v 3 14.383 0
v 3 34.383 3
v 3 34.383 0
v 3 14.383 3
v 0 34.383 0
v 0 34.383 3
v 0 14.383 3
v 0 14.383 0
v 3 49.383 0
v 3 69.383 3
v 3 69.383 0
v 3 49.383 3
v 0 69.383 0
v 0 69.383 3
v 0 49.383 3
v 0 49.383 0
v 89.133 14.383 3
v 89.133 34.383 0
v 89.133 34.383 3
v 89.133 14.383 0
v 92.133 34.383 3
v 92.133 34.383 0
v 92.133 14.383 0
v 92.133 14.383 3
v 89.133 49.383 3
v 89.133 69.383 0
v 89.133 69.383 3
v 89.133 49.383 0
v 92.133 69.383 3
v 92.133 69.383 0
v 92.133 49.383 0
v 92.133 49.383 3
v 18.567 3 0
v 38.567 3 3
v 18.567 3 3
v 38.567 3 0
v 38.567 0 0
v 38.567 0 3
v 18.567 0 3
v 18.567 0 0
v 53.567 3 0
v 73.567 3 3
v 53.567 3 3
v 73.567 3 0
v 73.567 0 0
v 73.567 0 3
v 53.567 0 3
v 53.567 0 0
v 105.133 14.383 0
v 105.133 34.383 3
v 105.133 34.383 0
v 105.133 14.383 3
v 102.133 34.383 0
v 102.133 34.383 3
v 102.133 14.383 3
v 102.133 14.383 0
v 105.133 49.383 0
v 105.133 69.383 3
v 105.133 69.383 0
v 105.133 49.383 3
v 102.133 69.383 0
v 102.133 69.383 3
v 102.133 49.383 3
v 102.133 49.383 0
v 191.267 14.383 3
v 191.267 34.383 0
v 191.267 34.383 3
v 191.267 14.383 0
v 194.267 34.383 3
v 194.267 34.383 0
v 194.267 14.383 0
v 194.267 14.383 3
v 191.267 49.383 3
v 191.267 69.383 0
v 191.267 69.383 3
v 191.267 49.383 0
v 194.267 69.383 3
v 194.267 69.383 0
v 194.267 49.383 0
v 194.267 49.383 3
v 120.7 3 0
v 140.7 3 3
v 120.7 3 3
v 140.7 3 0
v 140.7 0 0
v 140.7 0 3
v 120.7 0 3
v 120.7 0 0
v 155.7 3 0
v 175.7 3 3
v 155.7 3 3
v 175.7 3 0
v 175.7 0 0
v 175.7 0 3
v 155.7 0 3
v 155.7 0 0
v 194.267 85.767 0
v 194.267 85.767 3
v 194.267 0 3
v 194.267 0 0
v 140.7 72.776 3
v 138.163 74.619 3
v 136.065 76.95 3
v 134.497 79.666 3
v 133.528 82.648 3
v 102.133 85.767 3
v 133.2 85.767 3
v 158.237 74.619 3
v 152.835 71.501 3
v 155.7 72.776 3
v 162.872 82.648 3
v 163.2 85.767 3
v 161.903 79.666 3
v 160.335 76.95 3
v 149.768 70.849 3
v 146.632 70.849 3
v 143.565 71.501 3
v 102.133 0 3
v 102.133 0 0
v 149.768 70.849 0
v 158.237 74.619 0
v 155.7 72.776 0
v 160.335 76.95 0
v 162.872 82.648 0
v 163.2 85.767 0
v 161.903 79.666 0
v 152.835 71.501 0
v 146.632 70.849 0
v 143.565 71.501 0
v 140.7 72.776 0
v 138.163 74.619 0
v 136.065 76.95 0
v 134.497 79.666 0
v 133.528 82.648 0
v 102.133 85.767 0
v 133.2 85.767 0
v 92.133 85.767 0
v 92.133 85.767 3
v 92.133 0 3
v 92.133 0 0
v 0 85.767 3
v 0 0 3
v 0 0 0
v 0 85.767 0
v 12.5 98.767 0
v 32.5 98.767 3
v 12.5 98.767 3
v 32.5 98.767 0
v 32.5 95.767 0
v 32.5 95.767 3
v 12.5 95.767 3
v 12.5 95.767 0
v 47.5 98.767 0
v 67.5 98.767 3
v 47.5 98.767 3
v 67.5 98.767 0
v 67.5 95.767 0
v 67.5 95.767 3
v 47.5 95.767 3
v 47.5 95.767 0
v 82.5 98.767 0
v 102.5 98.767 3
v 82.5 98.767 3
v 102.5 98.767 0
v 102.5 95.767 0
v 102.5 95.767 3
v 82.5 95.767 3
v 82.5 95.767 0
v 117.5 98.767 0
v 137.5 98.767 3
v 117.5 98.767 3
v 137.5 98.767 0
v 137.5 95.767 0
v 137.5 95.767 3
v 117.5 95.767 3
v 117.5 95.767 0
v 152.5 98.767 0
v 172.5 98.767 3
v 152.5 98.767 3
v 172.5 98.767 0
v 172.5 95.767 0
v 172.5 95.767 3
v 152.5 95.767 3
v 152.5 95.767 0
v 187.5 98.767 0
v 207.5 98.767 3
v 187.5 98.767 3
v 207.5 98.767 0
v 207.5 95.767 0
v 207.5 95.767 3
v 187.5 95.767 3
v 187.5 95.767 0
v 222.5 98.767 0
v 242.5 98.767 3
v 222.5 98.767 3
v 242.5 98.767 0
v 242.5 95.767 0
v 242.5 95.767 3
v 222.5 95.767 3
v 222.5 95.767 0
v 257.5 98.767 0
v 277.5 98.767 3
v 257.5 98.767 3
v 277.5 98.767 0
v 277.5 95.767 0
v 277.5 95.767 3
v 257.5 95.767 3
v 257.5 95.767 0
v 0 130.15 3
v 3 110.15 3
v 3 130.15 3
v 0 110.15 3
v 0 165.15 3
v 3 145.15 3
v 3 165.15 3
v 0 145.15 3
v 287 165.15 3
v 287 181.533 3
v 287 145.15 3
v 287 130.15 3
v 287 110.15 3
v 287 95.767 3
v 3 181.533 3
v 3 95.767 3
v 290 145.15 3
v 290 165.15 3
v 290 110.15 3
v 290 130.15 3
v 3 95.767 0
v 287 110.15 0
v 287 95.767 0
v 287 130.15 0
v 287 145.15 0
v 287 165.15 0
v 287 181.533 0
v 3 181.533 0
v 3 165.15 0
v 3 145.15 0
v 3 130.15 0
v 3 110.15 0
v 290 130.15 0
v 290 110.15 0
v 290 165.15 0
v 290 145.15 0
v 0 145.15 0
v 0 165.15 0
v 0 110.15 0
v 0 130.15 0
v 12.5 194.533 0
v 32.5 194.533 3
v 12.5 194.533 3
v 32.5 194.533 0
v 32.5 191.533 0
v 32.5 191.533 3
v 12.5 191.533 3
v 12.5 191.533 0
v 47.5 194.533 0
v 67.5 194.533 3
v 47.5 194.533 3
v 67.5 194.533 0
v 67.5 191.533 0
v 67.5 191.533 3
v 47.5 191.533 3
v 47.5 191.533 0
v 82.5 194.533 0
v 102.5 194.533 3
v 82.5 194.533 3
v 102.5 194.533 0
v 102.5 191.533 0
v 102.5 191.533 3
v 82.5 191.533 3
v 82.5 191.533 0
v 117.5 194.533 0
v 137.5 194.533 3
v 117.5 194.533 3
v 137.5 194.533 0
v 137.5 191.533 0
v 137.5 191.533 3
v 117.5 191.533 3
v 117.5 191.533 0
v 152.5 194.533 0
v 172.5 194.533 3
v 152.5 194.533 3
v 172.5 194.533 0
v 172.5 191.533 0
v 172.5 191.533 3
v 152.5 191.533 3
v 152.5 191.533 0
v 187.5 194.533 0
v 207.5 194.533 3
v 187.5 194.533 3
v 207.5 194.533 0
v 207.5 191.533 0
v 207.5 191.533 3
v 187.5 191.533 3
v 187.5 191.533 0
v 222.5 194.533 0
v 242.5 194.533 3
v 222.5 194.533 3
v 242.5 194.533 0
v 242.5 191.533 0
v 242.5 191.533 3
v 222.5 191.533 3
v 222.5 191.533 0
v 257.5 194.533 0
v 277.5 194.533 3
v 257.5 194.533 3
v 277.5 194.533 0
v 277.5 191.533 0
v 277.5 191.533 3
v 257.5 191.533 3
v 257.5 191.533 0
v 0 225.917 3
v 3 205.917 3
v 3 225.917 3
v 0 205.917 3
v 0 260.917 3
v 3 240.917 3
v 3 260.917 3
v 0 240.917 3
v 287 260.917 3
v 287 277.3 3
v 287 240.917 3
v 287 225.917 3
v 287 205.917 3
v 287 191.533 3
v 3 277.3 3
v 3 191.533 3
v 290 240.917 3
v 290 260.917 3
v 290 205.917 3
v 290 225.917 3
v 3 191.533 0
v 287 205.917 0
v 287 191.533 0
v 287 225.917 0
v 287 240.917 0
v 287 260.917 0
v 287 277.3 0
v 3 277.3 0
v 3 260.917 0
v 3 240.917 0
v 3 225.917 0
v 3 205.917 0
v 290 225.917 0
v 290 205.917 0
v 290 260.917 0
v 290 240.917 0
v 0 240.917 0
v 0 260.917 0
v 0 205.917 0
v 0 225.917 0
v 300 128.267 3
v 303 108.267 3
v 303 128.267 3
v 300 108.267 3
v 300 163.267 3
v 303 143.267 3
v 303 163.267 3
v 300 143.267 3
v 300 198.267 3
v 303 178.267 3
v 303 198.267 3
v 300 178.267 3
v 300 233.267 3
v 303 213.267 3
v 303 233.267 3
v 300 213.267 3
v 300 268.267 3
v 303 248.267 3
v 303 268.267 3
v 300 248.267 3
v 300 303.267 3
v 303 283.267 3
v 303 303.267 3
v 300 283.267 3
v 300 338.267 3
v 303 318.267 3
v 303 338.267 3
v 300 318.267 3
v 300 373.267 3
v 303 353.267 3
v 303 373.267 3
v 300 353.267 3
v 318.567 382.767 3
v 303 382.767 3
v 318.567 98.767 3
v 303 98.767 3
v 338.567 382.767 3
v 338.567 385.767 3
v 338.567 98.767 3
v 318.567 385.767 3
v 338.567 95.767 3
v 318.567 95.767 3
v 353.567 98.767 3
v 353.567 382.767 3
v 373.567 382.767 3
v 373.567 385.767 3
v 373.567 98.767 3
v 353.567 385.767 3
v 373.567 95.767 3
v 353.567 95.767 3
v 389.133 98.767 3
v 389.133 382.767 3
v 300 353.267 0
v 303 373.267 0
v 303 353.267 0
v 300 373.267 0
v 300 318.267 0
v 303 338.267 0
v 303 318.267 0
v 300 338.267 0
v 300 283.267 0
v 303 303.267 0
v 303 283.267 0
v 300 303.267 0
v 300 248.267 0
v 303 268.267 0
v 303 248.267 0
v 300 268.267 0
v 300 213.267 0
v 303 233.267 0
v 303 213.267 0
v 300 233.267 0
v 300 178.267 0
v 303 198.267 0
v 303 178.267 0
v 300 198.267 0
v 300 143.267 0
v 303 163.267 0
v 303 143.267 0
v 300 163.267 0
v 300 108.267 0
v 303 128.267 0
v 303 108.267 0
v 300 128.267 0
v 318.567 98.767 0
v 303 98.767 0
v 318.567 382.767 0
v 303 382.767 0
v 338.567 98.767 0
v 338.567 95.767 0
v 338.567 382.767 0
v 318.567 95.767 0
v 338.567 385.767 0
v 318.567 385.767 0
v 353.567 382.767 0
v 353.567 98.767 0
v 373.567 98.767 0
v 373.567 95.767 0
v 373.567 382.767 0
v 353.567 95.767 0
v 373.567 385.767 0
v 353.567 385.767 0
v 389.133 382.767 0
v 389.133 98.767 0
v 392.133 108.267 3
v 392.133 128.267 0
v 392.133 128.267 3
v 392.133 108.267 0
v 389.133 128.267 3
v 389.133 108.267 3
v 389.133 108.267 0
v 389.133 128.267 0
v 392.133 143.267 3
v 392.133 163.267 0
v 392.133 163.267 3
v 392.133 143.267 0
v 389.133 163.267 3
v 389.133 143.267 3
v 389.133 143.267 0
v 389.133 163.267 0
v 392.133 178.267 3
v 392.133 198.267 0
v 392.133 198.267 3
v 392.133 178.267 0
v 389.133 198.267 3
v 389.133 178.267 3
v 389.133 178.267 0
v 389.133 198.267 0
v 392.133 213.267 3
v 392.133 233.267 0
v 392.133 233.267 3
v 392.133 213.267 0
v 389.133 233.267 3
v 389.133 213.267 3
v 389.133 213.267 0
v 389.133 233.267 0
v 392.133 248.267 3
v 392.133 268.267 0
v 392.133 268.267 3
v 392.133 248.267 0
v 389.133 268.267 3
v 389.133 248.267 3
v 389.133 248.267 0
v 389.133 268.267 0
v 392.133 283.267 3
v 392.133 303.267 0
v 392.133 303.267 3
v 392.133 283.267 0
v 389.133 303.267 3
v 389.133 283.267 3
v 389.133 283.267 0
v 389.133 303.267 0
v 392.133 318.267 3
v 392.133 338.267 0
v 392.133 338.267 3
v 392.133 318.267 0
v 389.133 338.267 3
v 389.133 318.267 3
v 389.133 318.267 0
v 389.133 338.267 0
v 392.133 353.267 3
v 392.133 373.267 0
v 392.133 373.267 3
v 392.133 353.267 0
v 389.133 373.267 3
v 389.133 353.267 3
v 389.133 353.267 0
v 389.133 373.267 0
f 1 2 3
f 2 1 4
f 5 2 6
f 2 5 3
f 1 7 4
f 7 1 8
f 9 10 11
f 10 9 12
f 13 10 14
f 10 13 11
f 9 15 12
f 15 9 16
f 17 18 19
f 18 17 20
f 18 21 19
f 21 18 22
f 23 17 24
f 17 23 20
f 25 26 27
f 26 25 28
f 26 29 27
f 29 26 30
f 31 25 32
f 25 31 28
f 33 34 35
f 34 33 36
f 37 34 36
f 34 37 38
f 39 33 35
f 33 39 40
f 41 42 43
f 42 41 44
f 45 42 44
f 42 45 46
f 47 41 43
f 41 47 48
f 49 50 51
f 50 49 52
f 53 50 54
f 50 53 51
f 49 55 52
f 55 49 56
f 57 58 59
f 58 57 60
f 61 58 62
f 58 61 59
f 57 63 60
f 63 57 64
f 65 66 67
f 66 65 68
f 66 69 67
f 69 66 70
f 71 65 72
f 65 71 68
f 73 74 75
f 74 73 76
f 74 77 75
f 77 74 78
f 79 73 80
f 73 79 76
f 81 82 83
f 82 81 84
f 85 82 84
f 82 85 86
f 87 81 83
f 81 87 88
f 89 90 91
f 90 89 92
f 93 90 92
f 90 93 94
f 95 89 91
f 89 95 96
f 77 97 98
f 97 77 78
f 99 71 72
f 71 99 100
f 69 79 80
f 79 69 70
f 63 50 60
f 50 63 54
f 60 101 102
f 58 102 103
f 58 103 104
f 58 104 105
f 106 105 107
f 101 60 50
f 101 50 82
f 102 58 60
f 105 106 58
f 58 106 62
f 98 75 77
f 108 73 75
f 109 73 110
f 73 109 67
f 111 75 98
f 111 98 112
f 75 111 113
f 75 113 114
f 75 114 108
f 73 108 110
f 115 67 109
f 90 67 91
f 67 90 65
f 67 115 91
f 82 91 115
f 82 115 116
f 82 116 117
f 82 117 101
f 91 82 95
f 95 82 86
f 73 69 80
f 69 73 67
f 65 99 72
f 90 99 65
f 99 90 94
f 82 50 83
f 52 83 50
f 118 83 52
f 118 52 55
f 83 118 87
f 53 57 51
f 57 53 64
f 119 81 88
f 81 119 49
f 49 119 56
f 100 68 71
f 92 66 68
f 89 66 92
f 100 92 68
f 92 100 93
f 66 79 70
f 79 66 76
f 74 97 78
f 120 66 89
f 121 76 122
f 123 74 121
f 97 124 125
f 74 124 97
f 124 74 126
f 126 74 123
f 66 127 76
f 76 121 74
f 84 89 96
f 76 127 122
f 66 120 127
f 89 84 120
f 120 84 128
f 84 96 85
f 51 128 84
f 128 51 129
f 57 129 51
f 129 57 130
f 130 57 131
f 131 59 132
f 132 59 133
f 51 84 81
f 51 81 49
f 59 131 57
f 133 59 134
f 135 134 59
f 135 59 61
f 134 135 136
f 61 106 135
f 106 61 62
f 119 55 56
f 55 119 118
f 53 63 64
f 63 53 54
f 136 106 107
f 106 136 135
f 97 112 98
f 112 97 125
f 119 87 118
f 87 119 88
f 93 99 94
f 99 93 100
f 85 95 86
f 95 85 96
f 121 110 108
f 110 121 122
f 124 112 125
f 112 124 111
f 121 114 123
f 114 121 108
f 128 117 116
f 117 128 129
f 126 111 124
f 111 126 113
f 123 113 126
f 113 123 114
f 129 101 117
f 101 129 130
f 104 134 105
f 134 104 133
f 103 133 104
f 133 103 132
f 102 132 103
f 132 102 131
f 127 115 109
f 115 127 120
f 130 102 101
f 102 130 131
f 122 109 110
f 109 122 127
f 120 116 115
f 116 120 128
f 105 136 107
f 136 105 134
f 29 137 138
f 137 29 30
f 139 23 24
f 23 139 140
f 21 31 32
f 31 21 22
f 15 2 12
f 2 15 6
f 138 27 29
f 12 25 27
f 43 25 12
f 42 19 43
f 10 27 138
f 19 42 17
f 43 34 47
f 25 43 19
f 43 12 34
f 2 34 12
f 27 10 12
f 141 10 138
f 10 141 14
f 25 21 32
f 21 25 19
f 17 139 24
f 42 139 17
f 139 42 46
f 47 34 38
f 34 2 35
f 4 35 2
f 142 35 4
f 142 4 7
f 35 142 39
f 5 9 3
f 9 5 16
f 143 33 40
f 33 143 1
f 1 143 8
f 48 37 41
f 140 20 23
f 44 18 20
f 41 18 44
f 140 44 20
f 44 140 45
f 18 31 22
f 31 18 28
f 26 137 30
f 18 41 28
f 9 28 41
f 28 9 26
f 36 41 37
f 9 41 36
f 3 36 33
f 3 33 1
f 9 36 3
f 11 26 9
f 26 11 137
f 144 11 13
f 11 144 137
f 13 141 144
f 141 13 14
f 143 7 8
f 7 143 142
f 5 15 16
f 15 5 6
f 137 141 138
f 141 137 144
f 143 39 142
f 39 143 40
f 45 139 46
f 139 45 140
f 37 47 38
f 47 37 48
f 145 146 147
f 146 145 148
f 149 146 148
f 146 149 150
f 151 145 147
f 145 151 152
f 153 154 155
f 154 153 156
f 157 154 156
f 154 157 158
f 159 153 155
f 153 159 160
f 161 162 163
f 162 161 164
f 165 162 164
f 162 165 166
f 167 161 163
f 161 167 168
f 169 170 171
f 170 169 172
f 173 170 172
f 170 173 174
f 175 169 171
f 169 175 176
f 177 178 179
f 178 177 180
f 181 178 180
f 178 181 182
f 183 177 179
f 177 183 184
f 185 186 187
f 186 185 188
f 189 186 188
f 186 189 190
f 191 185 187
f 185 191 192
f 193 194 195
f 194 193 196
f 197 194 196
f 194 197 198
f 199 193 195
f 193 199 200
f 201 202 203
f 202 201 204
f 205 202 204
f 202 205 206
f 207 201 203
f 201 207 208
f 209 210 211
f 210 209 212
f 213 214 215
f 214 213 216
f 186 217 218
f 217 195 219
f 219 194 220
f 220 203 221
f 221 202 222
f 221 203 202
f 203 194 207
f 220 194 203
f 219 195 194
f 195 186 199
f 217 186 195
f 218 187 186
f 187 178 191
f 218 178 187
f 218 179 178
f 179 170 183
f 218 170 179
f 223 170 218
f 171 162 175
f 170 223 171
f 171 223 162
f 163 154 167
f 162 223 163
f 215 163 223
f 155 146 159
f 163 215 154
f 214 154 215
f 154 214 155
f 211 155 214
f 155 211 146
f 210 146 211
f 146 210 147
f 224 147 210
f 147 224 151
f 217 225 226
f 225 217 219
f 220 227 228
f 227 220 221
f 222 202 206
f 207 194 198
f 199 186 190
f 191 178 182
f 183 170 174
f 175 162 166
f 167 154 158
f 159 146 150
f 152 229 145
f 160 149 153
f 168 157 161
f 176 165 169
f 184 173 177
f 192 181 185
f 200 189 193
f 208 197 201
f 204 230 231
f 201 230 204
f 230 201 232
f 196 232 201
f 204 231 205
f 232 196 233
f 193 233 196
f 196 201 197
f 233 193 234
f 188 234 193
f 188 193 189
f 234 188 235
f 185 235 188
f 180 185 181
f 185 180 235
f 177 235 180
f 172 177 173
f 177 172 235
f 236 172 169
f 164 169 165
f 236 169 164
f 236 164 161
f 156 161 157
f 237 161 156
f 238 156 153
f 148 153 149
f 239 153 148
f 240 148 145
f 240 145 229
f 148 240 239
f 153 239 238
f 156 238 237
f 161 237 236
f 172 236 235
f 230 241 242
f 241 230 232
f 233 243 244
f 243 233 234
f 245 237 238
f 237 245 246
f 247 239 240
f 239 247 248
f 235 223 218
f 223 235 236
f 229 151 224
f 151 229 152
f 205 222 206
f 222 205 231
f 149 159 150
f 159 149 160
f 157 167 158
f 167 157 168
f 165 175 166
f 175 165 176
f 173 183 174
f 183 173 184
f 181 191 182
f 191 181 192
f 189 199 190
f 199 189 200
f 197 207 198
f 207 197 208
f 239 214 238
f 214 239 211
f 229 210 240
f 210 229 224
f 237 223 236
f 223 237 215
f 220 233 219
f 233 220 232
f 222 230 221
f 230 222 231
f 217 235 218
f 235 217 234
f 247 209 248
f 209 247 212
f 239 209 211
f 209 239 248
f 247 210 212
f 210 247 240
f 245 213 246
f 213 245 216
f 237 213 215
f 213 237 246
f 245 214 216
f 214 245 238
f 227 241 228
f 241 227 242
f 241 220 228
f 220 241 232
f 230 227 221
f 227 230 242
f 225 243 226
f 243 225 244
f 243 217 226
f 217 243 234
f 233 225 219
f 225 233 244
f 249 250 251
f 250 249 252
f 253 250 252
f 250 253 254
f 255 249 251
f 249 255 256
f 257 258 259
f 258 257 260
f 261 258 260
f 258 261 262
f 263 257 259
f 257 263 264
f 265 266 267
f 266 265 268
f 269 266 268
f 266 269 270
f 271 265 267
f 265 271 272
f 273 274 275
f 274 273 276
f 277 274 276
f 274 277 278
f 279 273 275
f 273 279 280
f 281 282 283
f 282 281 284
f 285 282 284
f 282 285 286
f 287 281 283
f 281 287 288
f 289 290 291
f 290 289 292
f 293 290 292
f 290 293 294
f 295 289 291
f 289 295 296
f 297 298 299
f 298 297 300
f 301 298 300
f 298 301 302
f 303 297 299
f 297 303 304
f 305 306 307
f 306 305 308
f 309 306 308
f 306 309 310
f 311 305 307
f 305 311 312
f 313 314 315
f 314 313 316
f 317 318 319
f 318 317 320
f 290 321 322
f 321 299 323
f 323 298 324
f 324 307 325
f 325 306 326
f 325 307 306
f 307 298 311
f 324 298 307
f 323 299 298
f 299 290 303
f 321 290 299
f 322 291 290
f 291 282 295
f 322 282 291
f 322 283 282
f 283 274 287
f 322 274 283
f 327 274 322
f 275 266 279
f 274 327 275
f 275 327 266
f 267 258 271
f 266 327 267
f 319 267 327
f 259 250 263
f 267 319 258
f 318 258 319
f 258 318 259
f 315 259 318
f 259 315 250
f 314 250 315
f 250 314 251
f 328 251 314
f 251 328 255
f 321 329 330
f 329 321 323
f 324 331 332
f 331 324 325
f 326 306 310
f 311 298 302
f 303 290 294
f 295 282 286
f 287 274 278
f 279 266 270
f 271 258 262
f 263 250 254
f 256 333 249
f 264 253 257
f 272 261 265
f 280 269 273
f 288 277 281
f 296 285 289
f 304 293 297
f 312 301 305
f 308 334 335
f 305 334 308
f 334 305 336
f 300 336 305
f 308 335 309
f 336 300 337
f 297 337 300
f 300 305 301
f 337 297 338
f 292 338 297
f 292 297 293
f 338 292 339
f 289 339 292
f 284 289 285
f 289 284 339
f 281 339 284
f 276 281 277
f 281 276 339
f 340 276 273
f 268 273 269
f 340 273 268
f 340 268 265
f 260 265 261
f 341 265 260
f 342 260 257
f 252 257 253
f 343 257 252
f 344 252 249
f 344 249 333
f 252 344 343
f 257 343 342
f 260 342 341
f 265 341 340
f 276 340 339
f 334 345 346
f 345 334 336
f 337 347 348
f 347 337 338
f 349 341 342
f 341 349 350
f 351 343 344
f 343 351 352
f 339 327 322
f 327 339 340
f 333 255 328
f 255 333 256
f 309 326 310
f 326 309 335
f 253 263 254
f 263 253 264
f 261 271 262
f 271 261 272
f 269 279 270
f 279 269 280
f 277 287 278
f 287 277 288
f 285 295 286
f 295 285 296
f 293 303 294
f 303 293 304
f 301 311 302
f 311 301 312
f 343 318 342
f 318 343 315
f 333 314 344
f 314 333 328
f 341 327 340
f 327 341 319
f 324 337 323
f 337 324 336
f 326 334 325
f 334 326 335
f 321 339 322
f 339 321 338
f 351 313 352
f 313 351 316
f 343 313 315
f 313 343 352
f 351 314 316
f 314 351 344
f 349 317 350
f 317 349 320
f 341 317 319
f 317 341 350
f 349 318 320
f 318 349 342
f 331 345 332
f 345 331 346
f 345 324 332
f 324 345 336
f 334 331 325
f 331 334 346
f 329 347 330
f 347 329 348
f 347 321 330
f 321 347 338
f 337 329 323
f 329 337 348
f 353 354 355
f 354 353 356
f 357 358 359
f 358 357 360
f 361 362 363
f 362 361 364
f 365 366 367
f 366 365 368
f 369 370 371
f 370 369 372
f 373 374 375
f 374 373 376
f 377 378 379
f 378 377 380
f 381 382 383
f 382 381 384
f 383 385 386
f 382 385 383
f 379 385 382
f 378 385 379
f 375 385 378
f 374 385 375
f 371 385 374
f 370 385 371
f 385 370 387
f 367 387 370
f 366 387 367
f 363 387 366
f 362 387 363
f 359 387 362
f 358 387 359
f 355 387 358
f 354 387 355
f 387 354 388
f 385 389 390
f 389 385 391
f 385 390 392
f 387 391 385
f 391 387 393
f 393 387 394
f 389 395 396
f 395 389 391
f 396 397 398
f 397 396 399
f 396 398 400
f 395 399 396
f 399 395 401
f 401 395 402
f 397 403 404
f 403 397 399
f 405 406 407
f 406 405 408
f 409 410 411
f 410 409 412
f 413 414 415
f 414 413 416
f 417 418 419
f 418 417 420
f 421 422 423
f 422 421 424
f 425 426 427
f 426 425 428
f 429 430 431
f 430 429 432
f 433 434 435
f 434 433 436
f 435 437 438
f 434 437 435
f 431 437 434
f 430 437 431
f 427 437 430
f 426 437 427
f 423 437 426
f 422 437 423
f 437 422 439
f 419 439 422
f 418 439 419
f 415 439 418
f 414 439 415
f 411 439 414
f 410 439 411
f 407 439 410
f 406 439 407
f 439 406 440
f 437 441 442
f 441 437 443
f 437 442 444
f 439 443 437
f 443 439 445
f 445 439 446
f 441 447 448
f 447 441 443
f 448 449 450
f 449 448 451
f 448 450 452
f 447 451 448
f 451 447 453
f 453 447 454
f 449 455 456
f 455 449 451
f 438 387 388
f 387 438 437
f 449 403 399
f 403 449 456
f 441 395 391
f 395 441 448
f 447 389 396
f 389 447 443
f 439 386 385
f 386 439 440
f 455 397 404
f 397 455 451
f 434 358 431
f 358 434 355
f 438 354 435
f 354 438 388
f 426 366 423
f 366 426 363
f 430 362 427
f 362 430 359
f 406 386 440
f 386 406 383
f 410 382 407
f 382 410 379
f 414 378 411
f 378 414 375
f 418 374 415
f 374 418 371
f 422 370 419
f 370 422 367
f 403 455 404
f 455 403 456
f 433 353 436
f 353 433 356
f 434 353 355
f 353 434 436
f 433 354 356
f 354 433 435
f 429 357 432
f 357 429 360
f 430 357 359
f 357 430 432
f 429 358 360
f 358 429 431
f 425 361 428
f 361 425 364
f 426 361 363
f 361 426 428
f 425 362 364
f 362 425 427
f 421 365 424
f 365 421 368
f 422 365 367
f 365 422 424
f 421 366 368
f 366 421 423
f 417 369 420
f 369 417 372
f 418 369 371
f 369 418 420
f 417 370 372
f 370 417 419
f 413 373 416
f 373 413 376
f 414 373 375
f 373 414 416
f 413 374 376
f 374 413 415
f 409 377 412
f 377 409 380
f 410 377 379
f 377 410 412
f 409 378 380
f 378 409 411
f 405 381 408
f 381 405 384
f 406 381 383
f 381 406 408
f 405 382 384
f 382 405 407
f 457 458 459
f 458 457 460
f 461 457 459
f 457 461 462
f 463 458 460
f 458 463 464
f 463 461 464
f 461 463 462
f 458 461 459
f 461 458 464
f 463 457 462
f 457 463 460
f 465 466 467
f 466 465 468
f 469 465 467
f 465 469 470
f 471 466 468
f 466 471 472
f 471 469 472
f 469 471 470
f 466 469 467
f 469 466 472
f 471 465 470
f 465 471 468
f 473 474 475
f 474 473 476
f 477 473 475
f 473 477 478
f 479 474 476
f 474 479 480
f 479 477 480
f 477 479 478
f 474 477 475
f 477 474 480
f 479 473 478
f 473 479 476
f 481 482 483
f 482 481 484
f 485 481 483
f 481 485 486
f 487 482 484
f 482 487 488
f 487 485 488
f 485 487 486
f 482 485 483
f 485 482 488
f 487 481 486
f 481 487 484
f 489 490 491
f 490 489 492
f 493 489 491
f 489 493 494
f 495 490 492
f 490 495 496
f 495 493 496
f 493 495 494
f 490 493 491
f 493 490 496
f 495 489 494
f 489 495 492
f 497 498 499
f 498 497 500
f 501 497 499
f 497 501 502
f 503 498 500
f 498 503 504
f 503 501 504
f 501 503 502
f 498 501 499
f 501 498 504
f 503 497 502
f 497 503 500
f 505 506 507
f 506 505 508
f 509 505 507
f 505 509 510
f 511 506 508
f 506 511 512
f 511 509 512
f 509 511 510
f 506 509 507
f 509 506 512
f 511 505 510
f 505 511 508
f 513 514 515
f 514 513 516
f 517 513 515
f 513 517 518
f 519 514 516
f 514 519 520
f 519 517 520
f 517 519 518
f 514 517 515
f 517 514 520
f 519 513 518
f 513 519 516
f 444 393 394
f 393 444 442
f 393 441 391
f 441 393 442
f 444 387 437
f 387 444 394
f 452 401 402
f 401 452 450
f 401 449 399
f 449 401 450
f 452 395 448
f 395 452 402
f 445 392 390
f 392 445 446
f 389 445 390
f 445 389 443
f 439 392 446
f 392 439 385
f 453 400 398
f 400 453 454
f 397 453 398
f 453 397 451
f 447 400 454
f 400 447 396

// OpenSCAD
// file: common-functions.scad
module move(x=0,y=0,z=0,rx=0,ry=0,rz=0) { translate([x,y,z])rotate([rx,ry,rz]) children(); }
// file: modular-storage.parameters.scad
//
// Enter the dimensions of the stock you are
// using
//
draw_stock_thickness      = 3;
cabinetry_stock_thickness = 10;

//
// the base "modules" width (I wanted an internal dimension of 300mm)
//
cabinetry_width           = 300;
cabinetry_height          = 300;
cabinetry_depth           = 300;


//
// the spared, shared, between two drawers, or the draw and a wall
//
draws_gap                 = 0.9;
draw_front_back_thickness = draw_stock_thickness;
draw_bottom_thickness     = draw_stock_thickness;
draw_side_thickness       = draw_stock_thickness;
draw_grab_hole_height     = 15;
drawer_depth              = cabinetry_depth - cabinetry_stock_thickness;


// dovetail finger size
dovetail_finger_size      = 20;
dovetail_finger_gap       = 15;
dovetail_finger_clearance = 5; // how far from ends should we keep clear

//                               total             - left and right outer walls         n+1 extra space of the gap 
function draws_width_n_by(n)  = ( cabinetry_width  - (cabinetry_stock_thickness * 2) - ((n + 1) * draws_gap) ) / n;

//                               total             - top and bottom                  - shelves for drawers               - draw gap 
function draws_height_n_by(n) = ( cabinetry_height - (cabinetry_stock_thickness * 2) - ((n-1)*cabinetry_stock_thickness) - (n* draws_gap) ) / n;
// main file
include <modular-storage.parameters.scad>;
include <common-functions.scad>;


show_assembled     = false;
display_separation = 10;


//
// a dovetail is a set of blocks
// (use it in a difference, or as an add)
// it lays out the subtractive cuts, modulo up to the space made available
// offset true adds extra for difference and moves it
//
module dovetail_maker(dt_width, dt_height, dovetail_sep, panel_thickness, dt_height_space, offset = true, extra = true) { 

    // we take away one finger (theory is we alaways can fit one)
    // then divide the remaining space with a separator space and a finger
    dt_count = floor(( dt_height_space - dt_height)  / ( dt_height + dovetail_sep)) ;

    gap = (dt_height_space - ( (dt_count * ( dt_height + dovetail_sep) ) + dt_height )) / 2;
    

    move( y= gap) {
      for (i = [ 0 : dt_count ]) {
        move(y = (i * ( dovetail_sep + dt_height) ) )
            move(x=( offset ? -1 : 0), z=(extra? -0.5 : 0)) cube([dt_width + (extra? 1 : 0), dt_height, panel_thickness + (extra? 1 : 0)]);
      }
    }

}


module drawer_side_maker(height_stacked_count) { 

    d_depth          = drawer_depth;
    d_height         = draws_height_n_by(height_stacked_count);
    d_thickness      = draw_side_thickness;

    // where, on sides, do we put the dovetails ?
    dovetail_bottom_offset = draw_bottom_thickness + dovetail_finger_clearance;
    dovetail_total = dovetail_finger_gap + dovetail_finger_size;

    difference() { 
        cube([d_depth, d_height, d_thickness]);
        // cut off a front strip, so we can put the dovetails in place
        move(y=-0.5, x=-1, z=-0.5)cube([draw_front_back_thickness+1, d_height+1, d_thickness + 1]);

        // cut off a rear strip, so we can put the dovetails in place
        move(y=-0.5, x=d_depth - draw_front_back_thickness, z=-0.5)cube([draw_front_back_thickness+1, d_height+1, d_thickness + 1]);

        // bottom dovetail cutouts
        move(y=draw_bottom_thickness, x=draw_side_thickness + dovetail_finger_clearance)
            move(rz=-90)
                dovetail_maker(dt_width       = draw_bottom_thickness
                        , dt_height       = dovetail_finger_size
                        , dovetail_sep    = dovetail_finger_gap
                        , panel_thickness = d_thickness
                        , dt_height_space = (d_depth - (2* dovetail_finger_clearance) -(2 * draw_side_thickness))
                        , offset = false);

    }
    
    // front dovetails
    move(y=dovetail_bottom_offset)
        dovetail_maker(dt_width        = draw_side_thickness
                    , dt_height       = dovetail_finger_size
                    , dovetail_sep    = dovetail_finger_gap
                    , panel_thickness = d_thickness
                    , dt_height_space = (d_height - (2* dovetail_finger_clearance)- dovetail_bottom_offset)
                    , offset = false
                    , extra = false);

    // rear dovetails
    move(y=dovetail_bottom_offset, x=d_depth- draw_front_back_thickness)
        dovetail_maker(dt_width        = draw_side_thickness
                    , dt_height       = dovetail_finger_size
                    , dovetail_sep    = dovetail_finger_gap
                    , panel_thickness = d_thickness
                    , dt_height_space = (d_height - (2* dovetail_finger_clearance) - dovetail_bottom_offset)
                    , offset = false,
                    , extra = false);

}


module drawer_base_n(width_stacked_count) {
    
    d_width          = draws_width_n_by(width_stacked_count);
    d_thickness      = draw_bottom_thickness;
    d_depth          = drawer_depth;

    // where, on sides, do we put the dovetails ?
    dovetail_bottom_offset = draw_bottom_thickness + dovetail_finger_clearance;
    dovetail_total = dovetail_finger_gap + dovetail_finger_size;
    
    difference() { 
        cube([d_width, d_depth, d_thickness]);
        
        // front cut
        move(z=-0.5, y = -1, x=-0.5) cube([d_width+1, draw_front_back_thickness+1, d_thickness+1]);

        // back cut
        move(z=-0.5, y = d_depth - draw_front_back_thickness, x=-0.5) cube([d_width+1, draw_front_back_thickness+1, d_thickness+1]);

        // left cut
        move(z=-0.5, y = -0.5 , x=-1) cube([draw_side_thickness+1, d_depth + 1, d_thickness+1]);

        // right cut
        move(z=-0.5, y = -0.5 , x=d_width - draw_side_thickness) cube([draw_side_thickness+1, d_depth + 1, d_thickness+1]);

    }
    
    // left
    move(y=draw_front_back_thickness + dovetail_finger_clearance)
    dovetail_maker(dt_width       = draw_side_thickness
            , dt_height       = dovetail_finger_size
            , dovetail_sep    = dovetail_finger_gap
            , panel_thickness = d_thickness
            , dt_height_space = (d_depth - (2* dovetail_finger_clearance) - (2 * draw_front_back_thickness))
            , offset = false
            , extra = false);

    //right
    move(x=d_width - draw_side_thickness, y=draw_front_back_thickness + dovetail_finger_clearance) 
        dovetail_maker(dt_width       = draw_side_thickness
            , dt_height       = dovetail_finger_size
            , dovetail_sep    = dovetail_finger_gap
            , panel_thickness = d_thickness
            , dt_height_space = (d_depth - (2* dovetail_finger_clearance) - (2 * draw_front_back_thickness))
            , offset = false
            , extra = false);


    // front
    move(rz=-90, y=draw_front_back_thickness, x = dovetail_finger_clearance + draw_side_thickness)
        dovetail_maker(dt_width       = draw_front_back_thickness
            , dt_height       = dovetail_finger_size
            , dovetail_sep    = dovetail_finger_gap
            , panel_thickness = d_thickness
            , dt_height_space = (d_width - (2* dovetail_finger_clearance) - (2 * draw_side_thickness))
            , offset = false
            , extra = false);

    // back
    move(rz=-90, y=d_depth, x = dovetail_finger_clearance + draw_side_thickness)
        dovetail_maker(dt_width       = draw_front_back_thickness
            , dt_height       = dovetail_finger_size
            , dovetail_sep    = dovetail_finger_gap
            , panel_thickness = d_thickness
            , dt_height_space = (d_width - (2* dovetail_finger_clearance) - (2 * draw_side_thickness))
            , offset = false
            , extra = false);

}

//
// a front or a back of a drawer
//
module drawer_front_back_n_by_n(width_stacked_count, height_stacked_count, isfront=true) {
    
    d_width          = draws_width_n_by(width_stacked_count);
    d_height         = draws_height_n_by(height_stacked_count);
    d_thickness      = draw_front_back_thickness;

    // where, on sides, do we put the dovetails ?
    dovetail_bottom_offset = draw_bottom_thickness + dovetail_finger_clearance;
    dovetail_total = dovetail_finger_gap + dovetail_finger_size;


    difference() { 
       cube([d_width, d_height, d_thickness]);
       if ( isfront) move(y=d_height,z=-0.5, x=d_width/2) cylinder(r=draw_grab_hole_height, h=d_thickness+1);

        // left dovetail cutouts
        move(y=dovetail_bottom_offset)
            dovetail_maker(dt_width        = draw_side_thickness
                        , dt_height       = dovetail_finger_size
                        , dovetail_sep    = dovetail_finger_gap
                        , panel_thickness = d_thickness
                        , dt_height_space = (d_height - (2* dovetail_finger_clearance)- dovetail_bottom_offset)
                        , offset = true);

        // right dovetail cutouts
        move(y=dovetail_bottom_offset, x=d_width- d_thickness)
            dovetail_maker(dt_width        = draw_side_thickness
                        , dt_height       = dovetail_finger_size
                        , dovetail_sep    = dovetail_finger_gap
                        , panel_thickness = d_thickness
                        , dt_height_space = (d_height - (2* dovetail_finger_clearance)- dovetail_bottom_offset)
                        , offset = false);

        

        // bottom dovetail cutouts
        move(y=draw_bottom_thickness, x=draw_side_thickness + dovetail_finger_clearance)
           move(rz=-90)
                dovetail_maker(dt_width       = draw_bottom_thickness
                        , dt_height       = dovetail_finger_size
                        , dovetail_sep    = dovetail_finger_gap
                        , panel_thickness = d_thickness
                        , dt_height_space = (d_width - (2* dovetail_finger_clearance)- (2 * draw_side_thickness))
                        , offset = false);



        }


}

module drawer_front_n_by_n(ws, hs) { drawer_front_back_n_by_n(ws,hs, isfront = true); }
module drawer_back_n_by_n(ws, hs) { drawer_front_back_n_by_n(ws,hs, isfront = false); }


module draw(a, b) { 

    move(x=draws_width_n_by(a) + display_separation) drawer_front_n_by_n(a,b);
    drawer_back_n_by_n(a,b);

    move ( y = draws_height_n_by(b) + display_separation) {
        drawer_side_maker(b);
    }

    move ( y = (draws_height_n_by(b) + display_separation) * 2 ) {
        drawer_side_maker(b);
    }

    move ( y = draws_height_n_by(b) + display_separation, x = drawer_depth + display_separation) {
        drawer_base_n(a);
    }
    // dovetail_maker(dt_width=3,  dt_height = 10 , dovetail_sep= 20 , panel_thickness = 3 , dt_height_space = 90, offset = false);    
}

draw(3,3);
